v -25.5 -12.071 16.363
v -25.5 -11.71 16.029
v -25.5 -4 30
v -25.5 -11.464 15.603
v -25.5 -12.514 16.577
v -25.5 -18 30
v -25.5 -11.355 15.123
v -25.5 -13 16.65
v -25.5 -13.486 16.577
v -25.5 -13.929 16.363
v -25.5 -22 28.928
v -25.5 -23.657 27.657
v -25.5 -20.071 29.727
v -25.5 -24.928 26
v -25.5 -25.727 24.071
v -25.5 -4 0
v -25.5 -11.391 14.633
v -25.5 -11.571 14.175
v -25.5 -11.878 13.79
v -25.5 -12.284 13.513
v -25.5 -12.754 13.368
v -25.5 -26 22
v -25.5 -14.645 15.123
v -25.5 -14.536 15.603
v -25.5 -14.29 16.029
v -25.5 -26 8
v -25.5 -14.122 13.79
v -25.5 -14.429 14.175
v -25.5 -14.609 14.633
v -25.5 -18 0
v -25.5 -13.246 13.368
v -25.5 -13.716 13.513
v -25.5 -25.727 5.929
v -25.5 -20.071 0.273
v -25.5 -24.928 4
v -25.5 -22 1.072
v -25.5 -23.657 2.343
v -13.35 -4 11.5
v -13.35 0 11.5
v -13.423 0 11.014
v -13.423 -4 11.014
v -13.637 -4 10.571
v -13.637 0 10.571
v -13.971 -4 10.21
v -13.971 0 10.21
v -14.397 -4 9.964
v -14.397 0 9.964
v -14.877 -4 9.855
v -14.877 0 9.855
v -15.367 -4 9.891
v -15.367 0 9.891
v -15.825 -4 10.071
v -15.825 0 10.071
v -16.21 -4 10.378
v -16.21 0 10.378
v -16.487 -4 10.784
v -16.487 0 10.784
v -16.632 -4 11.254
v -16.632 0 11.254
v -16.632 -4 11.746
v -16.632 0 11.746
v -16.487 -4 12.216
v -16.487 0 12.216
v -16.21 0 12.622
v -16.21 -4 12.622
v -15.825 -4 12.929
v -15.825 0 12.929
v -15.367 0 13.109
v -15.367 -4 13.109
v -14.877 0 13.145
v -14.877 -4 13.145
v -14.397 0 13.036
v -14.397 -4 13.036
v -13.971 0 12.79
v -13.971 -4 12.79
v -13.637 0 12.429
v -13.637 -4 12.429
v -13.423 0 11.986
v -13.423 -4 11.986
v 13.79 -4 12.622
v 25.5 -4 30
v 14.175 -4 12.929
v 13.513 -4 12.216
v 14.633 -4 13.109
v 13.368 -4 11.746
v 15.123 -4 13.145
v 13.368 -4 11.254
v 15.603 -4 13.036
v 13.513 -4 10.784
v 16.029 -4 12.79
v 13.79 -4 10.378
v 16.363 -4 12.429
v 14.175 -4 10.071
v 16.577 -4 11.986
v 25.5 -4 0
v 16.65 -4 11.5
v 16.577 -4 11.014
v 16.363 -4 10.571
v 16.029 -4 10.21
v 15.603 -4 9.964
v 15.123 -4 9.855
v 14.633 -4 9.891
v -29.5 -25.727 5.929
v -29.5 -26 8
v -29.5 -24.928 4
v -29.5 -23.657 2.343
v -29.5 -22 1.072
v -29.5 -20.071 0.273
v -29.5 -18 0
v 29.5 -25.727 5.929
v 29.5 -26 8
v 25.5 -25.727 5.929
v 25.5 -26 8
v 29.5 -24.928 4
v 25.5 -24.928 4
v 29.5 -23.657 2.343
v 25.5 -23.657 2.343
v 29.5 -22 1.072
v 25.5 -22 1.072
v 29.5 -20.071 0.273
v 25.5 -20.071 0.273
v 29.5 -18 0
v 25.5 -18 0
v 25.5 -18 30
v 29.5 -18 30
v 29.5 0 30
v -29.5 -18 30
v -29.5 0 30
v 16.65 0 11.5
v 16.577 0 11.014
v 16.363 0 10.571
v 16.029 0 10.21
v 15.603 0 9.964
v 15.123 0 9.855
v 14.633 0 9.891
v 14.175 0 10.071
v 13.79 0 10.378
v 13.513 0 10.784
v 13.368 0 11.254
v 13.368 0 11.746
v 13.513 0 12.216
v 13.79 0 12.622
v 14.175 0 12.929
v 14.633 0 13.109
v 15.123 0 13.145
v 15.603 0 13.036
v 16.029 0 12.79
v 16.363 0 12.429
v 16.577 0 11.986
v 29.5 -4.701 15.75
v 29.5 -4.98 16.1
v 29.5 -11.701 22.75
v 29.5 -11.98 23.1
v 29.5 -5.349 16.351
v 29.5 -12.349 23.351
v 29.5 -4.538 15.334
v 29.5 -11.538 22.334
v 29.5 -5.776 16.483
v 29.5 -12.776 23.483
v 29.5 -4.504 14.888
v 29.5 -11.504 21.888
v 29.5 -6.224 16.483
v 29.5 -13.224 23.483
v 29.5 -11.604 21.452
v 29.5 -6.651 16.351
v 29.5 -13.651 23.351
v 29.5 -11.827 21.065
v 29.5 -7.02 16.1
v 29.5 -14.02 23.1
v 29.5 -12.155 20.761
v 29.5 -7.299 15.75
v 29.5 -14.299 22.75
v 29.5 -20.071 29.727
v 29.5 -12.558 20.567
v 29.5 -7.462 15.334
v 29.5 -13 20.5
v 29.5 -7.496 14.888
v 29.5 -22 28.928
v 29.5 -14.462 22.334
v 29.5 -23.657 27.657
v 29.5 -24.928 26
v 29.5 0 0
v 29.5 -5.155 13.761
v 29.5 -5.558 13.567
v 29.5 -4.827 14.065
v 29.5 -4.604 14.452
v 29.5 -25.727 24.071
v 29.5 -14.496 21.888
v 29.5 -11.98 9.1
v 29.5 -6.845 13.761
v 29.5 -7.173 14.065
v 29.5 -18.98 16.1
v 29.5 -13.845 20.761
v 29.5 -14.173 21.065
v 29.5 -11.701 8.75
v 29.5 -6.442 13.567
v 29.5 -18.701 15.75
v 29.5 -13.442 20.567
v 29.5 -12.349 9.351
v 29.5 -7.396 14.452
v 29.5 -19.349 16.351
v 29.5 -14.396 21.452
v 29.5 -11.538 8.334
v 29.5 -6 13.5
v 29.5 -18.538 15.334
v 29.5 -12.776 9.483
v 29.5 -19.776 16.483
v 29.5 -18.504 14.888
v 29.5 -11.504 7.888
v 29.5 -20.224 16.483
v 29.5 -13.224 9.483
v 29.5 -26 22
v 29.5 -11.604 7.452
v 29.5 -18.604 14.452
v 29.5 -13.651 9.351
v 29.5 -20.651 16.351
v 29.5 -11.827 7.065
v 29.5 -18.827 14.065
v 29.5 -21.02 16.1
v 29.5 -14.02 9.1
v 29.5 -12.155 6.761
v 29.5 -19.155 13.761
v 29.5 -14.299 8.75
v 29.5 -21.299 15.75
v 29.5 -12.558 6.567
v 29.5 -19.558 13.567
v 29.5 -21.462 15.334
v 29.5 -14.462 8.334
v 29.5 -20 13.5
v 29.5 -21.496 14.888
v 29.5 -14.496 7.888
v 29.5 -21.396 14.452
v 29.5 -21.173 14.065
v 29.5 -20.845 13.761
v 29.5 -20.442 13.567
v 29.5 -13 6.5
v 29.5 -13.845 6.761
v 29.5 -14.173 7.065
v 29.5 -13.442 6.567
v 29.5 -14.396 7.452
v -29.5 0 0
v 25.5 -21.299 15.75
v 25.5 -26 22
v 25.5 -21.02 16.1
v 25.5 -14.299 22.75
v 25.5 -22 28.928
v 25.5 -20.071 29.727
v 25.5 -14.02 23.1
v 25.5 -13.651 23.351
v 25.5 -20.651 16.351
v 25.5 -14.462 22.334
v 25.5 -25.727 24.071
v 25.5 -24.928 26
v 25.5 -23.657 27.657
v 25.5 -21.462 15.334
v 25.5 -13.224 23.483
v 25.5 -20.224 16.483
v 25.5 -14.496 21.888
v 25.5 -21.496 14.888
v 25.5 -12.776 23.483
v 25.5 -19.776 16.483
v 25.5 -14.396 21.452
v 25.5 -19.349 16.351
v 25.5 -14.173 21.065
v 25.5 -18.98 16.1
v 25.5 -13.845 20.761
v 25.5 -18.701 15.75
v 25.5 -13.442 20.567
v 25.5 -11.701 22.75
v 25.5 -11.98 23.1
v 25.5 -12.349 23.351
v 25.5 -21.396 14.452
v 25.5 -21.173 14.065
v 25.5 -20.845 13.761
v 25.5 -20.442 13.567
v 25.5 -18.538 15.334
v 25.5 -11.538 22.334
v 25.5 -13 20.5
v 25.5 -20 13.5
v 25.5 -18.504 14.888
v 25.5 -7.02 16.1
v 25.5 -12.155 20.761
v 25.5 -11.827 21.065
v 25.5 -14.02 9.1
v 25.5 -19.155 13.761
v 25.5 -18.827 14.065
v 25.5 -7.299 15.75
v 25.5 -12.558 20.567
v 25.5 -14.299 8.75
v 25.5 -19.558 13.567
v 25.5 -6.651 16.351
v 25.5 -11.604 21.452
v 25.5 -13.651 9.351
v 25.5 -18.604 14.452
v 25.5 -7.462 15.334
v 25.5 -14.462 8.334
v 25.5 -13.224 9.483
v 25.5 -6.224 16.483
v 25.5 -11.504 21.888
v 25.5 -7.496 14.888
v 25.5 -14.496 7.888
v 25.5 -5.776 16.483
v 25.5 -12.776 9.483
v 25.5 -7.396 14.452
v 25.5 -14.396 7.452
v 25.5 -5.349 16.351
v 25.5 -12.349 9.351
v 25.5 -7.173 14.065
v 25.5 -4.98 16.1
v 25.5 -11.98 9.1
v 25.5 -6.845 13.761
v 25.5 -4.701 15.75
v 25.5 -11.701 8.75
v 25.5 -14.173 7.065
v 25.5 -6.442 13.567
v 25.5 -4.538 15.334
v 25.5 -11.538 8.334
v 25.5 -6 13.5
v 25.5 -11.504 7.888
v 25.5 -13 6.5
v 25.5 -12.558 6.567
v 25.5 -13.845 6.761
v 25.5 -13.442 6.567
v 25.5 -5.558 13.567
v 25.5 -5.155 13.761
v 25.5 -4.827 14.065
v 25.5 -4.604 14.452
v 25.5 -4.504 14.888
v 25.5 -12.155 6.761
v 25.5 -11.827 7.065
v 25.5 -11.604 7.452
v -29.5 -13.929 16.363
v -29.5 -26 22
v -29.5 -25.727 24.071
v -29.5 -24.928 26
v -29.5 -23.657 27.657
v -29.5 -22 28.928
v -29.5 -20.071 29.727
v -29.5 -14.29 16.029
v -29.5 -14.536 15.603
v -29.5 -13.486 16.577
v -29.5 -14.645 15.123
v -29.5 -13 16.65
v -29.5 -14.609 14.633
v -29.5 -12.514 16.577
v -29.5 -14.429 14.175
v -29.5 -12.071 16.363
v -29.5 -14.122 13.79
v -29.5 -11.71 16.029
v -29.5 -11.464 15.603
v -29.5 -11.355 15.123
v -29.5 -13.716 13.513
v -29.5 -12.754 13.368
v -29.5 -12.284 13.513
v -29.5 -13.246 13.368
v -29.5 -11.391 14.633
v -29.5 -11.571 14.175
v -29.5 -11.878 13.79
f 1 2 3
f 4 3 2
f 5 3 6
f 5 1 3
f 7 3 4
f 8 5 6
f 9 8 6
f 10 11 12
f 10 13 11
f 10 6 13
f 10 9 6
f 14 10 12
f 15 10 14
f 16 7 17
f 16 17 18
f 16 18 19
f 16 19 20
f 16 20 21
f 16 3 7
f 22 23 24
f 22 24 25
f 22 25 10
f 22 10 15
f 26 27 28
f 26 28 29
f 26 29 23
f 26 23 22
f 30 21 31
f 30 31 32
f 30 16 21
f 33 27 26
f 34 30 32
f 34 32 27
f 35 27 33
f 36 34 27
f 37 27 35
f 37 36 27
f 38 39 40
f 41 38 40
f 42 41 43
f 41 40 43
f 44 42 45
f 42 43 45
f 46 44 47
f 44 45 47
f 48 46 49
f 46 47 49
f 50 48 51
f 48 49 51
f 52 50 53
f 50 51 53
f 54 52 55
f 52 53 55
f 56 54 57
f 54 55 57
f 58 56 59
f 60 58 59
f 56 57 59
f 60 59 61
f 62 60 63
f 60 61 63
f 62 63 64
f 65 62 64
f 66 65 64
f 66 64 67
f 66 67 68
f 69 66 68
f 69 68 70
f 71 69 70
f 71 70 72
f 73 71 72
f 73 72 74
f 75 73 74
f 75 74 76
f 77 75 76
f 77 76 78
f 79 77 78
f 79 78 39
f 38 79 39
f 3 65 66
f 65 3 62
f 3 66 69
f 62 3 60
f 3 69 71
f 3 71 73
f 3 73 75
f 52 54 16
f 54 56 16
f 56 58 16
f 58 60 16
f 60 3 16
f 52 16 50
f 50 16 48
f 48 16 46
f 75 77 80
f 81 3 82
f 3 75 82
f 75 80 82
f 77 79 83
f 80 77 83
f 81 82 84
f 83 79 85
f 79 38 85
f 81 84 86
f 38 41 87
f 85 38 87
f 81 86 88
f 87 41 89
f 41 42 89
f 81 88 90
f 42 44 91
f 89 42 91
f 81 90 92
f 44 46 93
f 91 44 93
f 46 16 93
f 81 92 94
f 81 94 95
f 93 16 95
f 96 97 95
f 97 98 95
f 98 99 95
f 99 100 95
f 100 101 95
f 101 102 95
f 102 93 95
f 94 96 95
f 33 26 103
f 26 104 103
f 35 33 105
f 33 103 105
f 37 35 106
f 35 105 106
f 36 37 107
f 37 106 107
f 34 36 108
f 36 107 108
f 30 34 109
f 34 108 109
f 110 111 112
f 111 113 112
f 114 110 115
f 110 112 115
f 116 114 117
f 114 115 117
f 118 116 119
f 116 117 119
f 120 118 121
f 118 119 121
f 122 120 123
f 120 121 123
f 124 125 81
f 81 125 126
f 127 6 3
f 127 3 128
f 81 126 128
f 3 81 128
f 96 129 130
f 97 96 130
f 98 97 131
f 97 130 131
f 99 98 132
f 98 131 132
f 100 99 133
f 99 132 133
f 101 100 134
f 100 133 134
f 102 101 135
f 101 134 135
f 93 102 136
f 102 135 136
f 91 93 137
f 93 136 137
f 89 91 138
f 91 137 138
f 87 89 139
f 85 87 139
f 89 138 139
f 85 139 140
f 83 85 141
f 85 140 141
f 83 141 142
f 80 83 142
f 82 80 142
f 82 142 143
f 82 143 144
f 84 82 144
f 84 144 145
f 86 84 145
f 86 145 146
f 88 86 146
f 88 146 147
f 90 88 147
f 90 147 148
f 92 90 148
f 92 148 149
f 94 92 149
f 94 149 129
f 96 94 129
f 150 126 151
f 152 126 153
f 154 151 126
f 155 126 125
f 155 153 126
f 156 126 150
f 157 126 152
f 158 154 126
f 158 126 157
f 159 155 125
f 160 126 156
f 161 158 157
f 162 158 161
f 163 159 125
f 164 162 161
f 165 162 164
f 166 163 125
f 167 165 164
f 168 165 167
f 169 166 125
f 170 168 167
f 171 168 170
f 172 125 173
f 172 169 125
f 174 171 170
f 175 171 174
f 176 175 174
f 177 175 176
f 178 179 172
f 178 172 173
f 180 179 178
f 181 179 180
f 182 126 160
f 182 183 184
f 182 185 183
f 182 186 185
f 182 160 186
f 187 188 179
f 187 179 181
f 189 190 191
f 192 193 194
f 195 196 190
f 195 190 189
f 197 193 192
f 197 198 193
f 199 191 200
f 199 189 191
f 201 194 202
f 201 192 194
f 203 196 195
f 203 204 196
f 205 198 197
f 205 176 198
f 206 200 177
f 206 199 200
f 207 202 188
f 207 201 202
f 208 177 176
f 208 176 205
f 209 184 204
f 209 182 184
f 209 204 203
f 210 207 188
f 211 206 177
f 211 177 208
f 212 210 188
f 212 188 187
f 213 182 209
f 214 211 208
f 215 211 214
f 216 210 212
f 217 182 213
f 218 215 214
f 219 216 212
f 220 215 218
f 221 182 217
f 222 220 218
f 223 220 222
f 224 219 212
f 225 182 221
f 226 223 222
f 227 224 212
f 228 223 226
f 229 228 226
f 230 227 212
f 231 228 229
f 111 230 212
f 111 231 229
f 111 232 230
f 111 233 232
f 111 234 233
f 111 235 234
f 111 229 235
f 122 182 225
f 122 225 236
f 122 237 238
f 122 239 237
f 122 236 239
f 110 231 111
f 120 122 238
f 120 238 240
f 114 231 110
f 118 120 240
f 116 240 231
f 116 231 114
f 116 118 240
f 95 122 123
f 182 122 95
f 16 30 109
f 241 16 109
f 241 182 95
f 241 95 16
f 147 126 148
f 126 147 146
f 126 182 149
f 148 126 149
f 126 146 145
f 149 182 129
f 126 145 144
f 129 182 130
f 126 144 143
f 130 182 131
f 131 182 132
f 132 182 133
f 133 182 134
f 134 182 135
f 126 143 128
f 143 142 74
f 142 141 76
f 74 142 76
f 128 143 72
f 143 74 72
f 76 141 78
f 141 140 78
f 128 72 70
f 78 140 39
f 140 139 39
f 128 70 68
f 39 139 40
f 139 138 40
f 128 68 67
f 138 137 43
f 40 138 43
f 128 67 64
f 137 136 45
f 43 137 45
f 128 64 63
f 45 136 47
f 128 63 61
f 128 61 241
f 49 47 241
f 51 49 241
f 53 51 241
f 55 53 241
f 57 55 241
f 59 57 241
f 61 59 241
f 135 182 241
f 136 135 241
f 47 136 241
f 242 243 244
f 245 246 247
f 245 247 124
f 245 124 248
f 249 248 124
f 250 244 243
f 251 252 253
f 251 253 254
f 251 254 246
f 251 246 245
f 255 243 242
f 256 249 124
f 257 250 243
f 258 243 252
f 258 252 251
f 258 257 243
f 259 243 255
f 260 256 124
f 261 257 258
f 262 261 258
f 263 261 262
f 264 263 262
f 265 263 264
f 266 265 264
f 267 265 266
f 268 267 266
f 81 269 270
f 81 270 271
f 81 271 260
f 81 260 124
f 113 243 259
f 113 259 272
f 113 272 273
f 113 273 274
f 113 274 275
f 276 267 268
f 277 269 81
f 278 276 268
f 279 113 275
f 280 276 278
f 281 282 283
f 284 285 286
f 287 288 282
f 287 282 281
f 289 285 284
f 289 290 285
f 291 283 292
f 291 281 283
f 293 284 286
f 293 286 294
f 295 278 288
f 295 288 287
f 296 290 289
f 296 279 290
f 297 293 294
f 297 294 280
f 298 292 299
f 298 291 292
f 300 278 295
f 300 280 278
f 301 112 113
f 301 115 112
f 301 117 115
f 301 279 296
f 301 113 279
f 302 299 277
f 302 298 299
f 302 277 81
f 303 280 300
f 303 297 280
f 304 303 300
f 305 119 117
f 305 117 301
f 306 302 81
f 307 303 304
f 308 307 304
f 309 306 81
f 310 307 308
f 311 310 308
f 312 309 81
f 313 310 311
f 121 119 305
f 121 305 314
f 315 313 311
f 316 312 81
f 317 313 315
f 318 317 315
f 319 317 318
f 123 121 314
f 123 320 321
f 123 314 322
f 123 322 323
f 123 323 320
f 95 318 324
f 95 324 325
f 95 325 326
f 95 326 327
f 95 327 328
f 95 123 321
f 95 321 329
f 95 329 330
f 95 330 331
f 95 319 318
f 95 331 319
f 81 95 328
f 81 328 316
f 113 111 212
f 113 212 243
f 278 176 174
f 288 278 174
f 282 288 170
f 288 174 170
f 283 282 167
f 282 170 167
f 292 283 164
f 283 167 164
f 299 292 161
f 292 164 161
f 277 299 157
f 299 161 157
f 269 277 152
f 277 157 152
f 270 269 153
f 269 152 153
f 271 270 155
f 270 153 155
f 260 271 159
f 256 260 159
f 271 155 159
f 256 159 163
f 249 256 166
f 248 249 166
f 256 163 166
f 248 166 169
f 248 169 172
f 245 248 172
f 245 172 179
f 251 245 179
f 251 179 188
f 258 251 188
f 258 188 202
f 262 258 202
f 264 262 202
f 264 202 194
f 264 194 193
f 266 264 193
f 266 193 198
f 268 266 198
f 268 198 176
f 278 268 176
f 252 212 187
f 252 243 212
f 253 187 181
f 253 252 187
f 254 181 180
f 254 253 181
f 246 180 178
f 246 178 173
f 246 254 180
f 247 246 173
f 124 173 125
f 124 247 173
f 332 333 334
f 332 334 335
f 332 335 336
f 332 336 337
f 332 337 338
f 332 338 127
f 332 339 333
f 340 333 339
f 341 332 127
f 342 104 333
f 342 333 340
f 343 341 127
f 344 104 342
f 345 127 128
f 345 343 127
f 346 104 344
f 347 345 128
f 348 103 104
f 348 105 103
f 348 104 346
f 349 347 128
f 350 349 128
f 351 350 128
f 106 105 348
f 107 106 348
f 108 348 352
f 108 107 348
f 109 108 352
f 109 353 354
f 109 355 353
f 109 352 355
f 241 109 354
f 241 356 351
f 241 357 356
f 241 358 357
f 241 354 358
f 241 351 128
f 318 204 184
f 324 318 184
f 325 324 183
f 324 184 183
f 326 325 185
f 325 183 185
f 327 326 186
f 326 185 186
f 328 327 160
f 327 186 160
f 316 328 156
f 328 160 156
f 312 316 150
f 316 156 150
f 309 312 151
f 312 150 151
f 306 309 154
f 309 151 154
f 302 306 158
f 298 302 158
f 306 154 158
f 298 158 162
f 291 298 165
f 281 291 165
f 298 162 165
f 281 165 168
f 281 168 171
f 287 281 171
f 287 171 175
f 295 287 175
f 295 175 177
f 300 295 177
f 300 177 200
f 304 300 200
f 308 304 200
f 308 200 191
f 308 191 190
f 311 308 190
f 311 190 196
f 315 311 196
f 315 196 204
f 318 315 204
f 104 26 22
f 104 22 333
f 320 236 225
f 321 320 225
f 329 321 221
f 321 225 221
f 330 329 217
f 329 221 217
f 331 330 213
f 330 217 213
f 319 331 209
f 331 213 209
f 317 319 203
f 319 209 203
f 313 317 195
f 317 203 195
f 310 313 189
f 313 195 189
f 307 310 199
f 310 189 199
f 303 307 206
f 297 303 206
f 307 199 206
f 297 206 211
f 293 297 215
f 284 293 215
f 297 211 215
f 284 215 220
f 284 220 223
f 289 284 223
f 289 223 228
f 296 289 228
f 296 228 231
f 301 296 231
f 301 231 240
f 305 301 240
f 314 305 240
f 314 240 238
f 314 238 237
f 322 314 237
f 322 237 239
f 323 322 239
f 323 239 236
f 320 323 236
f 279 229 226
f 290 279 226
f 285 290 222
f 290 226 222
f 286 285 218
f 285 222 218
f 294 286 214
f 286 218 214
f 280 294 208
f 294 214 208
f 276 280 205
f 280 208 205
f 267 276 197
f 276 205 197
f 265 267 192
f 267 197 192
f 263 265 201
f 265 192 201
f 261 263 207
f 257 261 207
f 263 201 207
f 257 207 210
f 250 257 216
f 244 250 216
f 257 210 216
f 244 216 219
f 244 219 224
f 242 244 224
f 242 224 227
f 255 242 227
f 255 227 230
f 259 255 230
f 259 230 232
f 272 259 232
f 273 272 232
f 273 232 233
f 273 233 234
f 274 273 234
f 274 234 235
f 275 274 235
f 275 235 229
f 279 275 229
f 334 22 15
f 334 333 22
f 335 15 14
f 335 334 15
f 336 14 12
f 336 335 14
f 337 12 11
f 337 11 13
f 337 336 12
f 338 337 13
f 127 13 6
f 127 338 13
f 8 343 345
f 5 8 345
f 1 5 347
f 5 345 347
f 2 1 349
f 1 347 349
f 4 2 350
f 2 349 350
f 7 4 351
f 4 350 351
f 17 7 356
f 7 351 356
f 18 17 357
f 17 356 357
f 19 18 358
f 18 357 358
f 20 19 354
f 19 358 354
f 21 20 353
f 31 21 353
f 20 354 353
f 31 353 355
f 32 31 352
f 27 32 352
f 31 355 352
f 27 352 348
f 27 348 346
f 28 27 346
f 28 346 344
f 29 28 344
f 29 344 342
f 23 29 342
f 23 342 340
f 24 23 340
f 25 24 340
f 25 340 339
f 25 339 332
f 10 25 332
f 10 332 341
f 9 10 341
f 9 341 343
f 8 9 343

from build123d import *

# Parameters (mm, degrees)
EXTRUDE_1_DEPTH     = 30
FILLET_1_R          = 8
SKETCH_4_R          = 1.65
CUT_EXTRUDE_1_DEPTH = 10
SKETCH_5_R          = 1.65
CUT_EXTRUDE_2_DEPTH = 10
SKETCH_6_R          = 1.5
CUT_EXTRUDE_3_DEPTH = 10


with BuildPart() as part:
    # 草图1 → 凸台-拉伸1 (new body)
    with BuildSketch(Plane.XY):
        Polygon((0, 0), (29.5, 0), (29.5, -26), (25.5, -26), (25.5, -4), (0, -4), (-25.5, -4), (-25.5, -26), (-29.5, -26), (-29.5, 0), align=None)
    extrude(amount=EXTRUDE_1_DEPTH)

    # 圆角1
    fillet_1_edges = [part.edges().sort_by_distance(p)[0] for p in [
        (27.5, -26, 0),
        (-27.5, -26, 0),
        (-27.5, -26, 30),
        (27.5, -26, 30),
    ]]
    fillet(fillet_1_edges, radius=FILLET_1_R)

    # 草图4 → 切除-拉伸1 (cut)
    with BuildSketch(Plane(origin=(0, 0, 0), x_dir=(1, 0, 0), z_dir=(0, 1, 0))):
        with Locations((15, -11.5)):
            Circle(SKETCH_4_R)
        with Locations((-15, -11.5)):
            Circle(SKETCH_4_R)
    extrude(amount=-CUT_EXTRUDE_1_DEPTH, mode=Mode.SUBTRACT)

    # 草图5 → 切除-拉伸2 (cut)
    with BuildSketch(Plane.ZY.offset(29.5)):
        with Locations((15, -13)):
            Circle(SKETCH_5_R)
    extrude(amount=-CUT_EXTRUDE_2_DEPTH, mode=Mode.SUBTRACT)

    # 草图6 → 切除-拉伸3 (cut)
    with BuildSketch(Plane(origin=(29.5, 0, 0), x_dir=(0, 0, -1), z_dir=(1, 0, 0))):
        with Locations((-15, -6)):
            Circle(SKETCH_6_R)
        with Locations((-8, -13)):
            Circle(SKETCH_6_R)
        with Locations((-15, -20)):
            Circle(SKETCH_6_R)
        with Locations((-22, -13)):
            Circle(SKETCH_6_R)
    extrude(amount=-CUT_EXTRUDE_3_DEPTH, mode=Mode.SUBTRACT)


solid = part.part
